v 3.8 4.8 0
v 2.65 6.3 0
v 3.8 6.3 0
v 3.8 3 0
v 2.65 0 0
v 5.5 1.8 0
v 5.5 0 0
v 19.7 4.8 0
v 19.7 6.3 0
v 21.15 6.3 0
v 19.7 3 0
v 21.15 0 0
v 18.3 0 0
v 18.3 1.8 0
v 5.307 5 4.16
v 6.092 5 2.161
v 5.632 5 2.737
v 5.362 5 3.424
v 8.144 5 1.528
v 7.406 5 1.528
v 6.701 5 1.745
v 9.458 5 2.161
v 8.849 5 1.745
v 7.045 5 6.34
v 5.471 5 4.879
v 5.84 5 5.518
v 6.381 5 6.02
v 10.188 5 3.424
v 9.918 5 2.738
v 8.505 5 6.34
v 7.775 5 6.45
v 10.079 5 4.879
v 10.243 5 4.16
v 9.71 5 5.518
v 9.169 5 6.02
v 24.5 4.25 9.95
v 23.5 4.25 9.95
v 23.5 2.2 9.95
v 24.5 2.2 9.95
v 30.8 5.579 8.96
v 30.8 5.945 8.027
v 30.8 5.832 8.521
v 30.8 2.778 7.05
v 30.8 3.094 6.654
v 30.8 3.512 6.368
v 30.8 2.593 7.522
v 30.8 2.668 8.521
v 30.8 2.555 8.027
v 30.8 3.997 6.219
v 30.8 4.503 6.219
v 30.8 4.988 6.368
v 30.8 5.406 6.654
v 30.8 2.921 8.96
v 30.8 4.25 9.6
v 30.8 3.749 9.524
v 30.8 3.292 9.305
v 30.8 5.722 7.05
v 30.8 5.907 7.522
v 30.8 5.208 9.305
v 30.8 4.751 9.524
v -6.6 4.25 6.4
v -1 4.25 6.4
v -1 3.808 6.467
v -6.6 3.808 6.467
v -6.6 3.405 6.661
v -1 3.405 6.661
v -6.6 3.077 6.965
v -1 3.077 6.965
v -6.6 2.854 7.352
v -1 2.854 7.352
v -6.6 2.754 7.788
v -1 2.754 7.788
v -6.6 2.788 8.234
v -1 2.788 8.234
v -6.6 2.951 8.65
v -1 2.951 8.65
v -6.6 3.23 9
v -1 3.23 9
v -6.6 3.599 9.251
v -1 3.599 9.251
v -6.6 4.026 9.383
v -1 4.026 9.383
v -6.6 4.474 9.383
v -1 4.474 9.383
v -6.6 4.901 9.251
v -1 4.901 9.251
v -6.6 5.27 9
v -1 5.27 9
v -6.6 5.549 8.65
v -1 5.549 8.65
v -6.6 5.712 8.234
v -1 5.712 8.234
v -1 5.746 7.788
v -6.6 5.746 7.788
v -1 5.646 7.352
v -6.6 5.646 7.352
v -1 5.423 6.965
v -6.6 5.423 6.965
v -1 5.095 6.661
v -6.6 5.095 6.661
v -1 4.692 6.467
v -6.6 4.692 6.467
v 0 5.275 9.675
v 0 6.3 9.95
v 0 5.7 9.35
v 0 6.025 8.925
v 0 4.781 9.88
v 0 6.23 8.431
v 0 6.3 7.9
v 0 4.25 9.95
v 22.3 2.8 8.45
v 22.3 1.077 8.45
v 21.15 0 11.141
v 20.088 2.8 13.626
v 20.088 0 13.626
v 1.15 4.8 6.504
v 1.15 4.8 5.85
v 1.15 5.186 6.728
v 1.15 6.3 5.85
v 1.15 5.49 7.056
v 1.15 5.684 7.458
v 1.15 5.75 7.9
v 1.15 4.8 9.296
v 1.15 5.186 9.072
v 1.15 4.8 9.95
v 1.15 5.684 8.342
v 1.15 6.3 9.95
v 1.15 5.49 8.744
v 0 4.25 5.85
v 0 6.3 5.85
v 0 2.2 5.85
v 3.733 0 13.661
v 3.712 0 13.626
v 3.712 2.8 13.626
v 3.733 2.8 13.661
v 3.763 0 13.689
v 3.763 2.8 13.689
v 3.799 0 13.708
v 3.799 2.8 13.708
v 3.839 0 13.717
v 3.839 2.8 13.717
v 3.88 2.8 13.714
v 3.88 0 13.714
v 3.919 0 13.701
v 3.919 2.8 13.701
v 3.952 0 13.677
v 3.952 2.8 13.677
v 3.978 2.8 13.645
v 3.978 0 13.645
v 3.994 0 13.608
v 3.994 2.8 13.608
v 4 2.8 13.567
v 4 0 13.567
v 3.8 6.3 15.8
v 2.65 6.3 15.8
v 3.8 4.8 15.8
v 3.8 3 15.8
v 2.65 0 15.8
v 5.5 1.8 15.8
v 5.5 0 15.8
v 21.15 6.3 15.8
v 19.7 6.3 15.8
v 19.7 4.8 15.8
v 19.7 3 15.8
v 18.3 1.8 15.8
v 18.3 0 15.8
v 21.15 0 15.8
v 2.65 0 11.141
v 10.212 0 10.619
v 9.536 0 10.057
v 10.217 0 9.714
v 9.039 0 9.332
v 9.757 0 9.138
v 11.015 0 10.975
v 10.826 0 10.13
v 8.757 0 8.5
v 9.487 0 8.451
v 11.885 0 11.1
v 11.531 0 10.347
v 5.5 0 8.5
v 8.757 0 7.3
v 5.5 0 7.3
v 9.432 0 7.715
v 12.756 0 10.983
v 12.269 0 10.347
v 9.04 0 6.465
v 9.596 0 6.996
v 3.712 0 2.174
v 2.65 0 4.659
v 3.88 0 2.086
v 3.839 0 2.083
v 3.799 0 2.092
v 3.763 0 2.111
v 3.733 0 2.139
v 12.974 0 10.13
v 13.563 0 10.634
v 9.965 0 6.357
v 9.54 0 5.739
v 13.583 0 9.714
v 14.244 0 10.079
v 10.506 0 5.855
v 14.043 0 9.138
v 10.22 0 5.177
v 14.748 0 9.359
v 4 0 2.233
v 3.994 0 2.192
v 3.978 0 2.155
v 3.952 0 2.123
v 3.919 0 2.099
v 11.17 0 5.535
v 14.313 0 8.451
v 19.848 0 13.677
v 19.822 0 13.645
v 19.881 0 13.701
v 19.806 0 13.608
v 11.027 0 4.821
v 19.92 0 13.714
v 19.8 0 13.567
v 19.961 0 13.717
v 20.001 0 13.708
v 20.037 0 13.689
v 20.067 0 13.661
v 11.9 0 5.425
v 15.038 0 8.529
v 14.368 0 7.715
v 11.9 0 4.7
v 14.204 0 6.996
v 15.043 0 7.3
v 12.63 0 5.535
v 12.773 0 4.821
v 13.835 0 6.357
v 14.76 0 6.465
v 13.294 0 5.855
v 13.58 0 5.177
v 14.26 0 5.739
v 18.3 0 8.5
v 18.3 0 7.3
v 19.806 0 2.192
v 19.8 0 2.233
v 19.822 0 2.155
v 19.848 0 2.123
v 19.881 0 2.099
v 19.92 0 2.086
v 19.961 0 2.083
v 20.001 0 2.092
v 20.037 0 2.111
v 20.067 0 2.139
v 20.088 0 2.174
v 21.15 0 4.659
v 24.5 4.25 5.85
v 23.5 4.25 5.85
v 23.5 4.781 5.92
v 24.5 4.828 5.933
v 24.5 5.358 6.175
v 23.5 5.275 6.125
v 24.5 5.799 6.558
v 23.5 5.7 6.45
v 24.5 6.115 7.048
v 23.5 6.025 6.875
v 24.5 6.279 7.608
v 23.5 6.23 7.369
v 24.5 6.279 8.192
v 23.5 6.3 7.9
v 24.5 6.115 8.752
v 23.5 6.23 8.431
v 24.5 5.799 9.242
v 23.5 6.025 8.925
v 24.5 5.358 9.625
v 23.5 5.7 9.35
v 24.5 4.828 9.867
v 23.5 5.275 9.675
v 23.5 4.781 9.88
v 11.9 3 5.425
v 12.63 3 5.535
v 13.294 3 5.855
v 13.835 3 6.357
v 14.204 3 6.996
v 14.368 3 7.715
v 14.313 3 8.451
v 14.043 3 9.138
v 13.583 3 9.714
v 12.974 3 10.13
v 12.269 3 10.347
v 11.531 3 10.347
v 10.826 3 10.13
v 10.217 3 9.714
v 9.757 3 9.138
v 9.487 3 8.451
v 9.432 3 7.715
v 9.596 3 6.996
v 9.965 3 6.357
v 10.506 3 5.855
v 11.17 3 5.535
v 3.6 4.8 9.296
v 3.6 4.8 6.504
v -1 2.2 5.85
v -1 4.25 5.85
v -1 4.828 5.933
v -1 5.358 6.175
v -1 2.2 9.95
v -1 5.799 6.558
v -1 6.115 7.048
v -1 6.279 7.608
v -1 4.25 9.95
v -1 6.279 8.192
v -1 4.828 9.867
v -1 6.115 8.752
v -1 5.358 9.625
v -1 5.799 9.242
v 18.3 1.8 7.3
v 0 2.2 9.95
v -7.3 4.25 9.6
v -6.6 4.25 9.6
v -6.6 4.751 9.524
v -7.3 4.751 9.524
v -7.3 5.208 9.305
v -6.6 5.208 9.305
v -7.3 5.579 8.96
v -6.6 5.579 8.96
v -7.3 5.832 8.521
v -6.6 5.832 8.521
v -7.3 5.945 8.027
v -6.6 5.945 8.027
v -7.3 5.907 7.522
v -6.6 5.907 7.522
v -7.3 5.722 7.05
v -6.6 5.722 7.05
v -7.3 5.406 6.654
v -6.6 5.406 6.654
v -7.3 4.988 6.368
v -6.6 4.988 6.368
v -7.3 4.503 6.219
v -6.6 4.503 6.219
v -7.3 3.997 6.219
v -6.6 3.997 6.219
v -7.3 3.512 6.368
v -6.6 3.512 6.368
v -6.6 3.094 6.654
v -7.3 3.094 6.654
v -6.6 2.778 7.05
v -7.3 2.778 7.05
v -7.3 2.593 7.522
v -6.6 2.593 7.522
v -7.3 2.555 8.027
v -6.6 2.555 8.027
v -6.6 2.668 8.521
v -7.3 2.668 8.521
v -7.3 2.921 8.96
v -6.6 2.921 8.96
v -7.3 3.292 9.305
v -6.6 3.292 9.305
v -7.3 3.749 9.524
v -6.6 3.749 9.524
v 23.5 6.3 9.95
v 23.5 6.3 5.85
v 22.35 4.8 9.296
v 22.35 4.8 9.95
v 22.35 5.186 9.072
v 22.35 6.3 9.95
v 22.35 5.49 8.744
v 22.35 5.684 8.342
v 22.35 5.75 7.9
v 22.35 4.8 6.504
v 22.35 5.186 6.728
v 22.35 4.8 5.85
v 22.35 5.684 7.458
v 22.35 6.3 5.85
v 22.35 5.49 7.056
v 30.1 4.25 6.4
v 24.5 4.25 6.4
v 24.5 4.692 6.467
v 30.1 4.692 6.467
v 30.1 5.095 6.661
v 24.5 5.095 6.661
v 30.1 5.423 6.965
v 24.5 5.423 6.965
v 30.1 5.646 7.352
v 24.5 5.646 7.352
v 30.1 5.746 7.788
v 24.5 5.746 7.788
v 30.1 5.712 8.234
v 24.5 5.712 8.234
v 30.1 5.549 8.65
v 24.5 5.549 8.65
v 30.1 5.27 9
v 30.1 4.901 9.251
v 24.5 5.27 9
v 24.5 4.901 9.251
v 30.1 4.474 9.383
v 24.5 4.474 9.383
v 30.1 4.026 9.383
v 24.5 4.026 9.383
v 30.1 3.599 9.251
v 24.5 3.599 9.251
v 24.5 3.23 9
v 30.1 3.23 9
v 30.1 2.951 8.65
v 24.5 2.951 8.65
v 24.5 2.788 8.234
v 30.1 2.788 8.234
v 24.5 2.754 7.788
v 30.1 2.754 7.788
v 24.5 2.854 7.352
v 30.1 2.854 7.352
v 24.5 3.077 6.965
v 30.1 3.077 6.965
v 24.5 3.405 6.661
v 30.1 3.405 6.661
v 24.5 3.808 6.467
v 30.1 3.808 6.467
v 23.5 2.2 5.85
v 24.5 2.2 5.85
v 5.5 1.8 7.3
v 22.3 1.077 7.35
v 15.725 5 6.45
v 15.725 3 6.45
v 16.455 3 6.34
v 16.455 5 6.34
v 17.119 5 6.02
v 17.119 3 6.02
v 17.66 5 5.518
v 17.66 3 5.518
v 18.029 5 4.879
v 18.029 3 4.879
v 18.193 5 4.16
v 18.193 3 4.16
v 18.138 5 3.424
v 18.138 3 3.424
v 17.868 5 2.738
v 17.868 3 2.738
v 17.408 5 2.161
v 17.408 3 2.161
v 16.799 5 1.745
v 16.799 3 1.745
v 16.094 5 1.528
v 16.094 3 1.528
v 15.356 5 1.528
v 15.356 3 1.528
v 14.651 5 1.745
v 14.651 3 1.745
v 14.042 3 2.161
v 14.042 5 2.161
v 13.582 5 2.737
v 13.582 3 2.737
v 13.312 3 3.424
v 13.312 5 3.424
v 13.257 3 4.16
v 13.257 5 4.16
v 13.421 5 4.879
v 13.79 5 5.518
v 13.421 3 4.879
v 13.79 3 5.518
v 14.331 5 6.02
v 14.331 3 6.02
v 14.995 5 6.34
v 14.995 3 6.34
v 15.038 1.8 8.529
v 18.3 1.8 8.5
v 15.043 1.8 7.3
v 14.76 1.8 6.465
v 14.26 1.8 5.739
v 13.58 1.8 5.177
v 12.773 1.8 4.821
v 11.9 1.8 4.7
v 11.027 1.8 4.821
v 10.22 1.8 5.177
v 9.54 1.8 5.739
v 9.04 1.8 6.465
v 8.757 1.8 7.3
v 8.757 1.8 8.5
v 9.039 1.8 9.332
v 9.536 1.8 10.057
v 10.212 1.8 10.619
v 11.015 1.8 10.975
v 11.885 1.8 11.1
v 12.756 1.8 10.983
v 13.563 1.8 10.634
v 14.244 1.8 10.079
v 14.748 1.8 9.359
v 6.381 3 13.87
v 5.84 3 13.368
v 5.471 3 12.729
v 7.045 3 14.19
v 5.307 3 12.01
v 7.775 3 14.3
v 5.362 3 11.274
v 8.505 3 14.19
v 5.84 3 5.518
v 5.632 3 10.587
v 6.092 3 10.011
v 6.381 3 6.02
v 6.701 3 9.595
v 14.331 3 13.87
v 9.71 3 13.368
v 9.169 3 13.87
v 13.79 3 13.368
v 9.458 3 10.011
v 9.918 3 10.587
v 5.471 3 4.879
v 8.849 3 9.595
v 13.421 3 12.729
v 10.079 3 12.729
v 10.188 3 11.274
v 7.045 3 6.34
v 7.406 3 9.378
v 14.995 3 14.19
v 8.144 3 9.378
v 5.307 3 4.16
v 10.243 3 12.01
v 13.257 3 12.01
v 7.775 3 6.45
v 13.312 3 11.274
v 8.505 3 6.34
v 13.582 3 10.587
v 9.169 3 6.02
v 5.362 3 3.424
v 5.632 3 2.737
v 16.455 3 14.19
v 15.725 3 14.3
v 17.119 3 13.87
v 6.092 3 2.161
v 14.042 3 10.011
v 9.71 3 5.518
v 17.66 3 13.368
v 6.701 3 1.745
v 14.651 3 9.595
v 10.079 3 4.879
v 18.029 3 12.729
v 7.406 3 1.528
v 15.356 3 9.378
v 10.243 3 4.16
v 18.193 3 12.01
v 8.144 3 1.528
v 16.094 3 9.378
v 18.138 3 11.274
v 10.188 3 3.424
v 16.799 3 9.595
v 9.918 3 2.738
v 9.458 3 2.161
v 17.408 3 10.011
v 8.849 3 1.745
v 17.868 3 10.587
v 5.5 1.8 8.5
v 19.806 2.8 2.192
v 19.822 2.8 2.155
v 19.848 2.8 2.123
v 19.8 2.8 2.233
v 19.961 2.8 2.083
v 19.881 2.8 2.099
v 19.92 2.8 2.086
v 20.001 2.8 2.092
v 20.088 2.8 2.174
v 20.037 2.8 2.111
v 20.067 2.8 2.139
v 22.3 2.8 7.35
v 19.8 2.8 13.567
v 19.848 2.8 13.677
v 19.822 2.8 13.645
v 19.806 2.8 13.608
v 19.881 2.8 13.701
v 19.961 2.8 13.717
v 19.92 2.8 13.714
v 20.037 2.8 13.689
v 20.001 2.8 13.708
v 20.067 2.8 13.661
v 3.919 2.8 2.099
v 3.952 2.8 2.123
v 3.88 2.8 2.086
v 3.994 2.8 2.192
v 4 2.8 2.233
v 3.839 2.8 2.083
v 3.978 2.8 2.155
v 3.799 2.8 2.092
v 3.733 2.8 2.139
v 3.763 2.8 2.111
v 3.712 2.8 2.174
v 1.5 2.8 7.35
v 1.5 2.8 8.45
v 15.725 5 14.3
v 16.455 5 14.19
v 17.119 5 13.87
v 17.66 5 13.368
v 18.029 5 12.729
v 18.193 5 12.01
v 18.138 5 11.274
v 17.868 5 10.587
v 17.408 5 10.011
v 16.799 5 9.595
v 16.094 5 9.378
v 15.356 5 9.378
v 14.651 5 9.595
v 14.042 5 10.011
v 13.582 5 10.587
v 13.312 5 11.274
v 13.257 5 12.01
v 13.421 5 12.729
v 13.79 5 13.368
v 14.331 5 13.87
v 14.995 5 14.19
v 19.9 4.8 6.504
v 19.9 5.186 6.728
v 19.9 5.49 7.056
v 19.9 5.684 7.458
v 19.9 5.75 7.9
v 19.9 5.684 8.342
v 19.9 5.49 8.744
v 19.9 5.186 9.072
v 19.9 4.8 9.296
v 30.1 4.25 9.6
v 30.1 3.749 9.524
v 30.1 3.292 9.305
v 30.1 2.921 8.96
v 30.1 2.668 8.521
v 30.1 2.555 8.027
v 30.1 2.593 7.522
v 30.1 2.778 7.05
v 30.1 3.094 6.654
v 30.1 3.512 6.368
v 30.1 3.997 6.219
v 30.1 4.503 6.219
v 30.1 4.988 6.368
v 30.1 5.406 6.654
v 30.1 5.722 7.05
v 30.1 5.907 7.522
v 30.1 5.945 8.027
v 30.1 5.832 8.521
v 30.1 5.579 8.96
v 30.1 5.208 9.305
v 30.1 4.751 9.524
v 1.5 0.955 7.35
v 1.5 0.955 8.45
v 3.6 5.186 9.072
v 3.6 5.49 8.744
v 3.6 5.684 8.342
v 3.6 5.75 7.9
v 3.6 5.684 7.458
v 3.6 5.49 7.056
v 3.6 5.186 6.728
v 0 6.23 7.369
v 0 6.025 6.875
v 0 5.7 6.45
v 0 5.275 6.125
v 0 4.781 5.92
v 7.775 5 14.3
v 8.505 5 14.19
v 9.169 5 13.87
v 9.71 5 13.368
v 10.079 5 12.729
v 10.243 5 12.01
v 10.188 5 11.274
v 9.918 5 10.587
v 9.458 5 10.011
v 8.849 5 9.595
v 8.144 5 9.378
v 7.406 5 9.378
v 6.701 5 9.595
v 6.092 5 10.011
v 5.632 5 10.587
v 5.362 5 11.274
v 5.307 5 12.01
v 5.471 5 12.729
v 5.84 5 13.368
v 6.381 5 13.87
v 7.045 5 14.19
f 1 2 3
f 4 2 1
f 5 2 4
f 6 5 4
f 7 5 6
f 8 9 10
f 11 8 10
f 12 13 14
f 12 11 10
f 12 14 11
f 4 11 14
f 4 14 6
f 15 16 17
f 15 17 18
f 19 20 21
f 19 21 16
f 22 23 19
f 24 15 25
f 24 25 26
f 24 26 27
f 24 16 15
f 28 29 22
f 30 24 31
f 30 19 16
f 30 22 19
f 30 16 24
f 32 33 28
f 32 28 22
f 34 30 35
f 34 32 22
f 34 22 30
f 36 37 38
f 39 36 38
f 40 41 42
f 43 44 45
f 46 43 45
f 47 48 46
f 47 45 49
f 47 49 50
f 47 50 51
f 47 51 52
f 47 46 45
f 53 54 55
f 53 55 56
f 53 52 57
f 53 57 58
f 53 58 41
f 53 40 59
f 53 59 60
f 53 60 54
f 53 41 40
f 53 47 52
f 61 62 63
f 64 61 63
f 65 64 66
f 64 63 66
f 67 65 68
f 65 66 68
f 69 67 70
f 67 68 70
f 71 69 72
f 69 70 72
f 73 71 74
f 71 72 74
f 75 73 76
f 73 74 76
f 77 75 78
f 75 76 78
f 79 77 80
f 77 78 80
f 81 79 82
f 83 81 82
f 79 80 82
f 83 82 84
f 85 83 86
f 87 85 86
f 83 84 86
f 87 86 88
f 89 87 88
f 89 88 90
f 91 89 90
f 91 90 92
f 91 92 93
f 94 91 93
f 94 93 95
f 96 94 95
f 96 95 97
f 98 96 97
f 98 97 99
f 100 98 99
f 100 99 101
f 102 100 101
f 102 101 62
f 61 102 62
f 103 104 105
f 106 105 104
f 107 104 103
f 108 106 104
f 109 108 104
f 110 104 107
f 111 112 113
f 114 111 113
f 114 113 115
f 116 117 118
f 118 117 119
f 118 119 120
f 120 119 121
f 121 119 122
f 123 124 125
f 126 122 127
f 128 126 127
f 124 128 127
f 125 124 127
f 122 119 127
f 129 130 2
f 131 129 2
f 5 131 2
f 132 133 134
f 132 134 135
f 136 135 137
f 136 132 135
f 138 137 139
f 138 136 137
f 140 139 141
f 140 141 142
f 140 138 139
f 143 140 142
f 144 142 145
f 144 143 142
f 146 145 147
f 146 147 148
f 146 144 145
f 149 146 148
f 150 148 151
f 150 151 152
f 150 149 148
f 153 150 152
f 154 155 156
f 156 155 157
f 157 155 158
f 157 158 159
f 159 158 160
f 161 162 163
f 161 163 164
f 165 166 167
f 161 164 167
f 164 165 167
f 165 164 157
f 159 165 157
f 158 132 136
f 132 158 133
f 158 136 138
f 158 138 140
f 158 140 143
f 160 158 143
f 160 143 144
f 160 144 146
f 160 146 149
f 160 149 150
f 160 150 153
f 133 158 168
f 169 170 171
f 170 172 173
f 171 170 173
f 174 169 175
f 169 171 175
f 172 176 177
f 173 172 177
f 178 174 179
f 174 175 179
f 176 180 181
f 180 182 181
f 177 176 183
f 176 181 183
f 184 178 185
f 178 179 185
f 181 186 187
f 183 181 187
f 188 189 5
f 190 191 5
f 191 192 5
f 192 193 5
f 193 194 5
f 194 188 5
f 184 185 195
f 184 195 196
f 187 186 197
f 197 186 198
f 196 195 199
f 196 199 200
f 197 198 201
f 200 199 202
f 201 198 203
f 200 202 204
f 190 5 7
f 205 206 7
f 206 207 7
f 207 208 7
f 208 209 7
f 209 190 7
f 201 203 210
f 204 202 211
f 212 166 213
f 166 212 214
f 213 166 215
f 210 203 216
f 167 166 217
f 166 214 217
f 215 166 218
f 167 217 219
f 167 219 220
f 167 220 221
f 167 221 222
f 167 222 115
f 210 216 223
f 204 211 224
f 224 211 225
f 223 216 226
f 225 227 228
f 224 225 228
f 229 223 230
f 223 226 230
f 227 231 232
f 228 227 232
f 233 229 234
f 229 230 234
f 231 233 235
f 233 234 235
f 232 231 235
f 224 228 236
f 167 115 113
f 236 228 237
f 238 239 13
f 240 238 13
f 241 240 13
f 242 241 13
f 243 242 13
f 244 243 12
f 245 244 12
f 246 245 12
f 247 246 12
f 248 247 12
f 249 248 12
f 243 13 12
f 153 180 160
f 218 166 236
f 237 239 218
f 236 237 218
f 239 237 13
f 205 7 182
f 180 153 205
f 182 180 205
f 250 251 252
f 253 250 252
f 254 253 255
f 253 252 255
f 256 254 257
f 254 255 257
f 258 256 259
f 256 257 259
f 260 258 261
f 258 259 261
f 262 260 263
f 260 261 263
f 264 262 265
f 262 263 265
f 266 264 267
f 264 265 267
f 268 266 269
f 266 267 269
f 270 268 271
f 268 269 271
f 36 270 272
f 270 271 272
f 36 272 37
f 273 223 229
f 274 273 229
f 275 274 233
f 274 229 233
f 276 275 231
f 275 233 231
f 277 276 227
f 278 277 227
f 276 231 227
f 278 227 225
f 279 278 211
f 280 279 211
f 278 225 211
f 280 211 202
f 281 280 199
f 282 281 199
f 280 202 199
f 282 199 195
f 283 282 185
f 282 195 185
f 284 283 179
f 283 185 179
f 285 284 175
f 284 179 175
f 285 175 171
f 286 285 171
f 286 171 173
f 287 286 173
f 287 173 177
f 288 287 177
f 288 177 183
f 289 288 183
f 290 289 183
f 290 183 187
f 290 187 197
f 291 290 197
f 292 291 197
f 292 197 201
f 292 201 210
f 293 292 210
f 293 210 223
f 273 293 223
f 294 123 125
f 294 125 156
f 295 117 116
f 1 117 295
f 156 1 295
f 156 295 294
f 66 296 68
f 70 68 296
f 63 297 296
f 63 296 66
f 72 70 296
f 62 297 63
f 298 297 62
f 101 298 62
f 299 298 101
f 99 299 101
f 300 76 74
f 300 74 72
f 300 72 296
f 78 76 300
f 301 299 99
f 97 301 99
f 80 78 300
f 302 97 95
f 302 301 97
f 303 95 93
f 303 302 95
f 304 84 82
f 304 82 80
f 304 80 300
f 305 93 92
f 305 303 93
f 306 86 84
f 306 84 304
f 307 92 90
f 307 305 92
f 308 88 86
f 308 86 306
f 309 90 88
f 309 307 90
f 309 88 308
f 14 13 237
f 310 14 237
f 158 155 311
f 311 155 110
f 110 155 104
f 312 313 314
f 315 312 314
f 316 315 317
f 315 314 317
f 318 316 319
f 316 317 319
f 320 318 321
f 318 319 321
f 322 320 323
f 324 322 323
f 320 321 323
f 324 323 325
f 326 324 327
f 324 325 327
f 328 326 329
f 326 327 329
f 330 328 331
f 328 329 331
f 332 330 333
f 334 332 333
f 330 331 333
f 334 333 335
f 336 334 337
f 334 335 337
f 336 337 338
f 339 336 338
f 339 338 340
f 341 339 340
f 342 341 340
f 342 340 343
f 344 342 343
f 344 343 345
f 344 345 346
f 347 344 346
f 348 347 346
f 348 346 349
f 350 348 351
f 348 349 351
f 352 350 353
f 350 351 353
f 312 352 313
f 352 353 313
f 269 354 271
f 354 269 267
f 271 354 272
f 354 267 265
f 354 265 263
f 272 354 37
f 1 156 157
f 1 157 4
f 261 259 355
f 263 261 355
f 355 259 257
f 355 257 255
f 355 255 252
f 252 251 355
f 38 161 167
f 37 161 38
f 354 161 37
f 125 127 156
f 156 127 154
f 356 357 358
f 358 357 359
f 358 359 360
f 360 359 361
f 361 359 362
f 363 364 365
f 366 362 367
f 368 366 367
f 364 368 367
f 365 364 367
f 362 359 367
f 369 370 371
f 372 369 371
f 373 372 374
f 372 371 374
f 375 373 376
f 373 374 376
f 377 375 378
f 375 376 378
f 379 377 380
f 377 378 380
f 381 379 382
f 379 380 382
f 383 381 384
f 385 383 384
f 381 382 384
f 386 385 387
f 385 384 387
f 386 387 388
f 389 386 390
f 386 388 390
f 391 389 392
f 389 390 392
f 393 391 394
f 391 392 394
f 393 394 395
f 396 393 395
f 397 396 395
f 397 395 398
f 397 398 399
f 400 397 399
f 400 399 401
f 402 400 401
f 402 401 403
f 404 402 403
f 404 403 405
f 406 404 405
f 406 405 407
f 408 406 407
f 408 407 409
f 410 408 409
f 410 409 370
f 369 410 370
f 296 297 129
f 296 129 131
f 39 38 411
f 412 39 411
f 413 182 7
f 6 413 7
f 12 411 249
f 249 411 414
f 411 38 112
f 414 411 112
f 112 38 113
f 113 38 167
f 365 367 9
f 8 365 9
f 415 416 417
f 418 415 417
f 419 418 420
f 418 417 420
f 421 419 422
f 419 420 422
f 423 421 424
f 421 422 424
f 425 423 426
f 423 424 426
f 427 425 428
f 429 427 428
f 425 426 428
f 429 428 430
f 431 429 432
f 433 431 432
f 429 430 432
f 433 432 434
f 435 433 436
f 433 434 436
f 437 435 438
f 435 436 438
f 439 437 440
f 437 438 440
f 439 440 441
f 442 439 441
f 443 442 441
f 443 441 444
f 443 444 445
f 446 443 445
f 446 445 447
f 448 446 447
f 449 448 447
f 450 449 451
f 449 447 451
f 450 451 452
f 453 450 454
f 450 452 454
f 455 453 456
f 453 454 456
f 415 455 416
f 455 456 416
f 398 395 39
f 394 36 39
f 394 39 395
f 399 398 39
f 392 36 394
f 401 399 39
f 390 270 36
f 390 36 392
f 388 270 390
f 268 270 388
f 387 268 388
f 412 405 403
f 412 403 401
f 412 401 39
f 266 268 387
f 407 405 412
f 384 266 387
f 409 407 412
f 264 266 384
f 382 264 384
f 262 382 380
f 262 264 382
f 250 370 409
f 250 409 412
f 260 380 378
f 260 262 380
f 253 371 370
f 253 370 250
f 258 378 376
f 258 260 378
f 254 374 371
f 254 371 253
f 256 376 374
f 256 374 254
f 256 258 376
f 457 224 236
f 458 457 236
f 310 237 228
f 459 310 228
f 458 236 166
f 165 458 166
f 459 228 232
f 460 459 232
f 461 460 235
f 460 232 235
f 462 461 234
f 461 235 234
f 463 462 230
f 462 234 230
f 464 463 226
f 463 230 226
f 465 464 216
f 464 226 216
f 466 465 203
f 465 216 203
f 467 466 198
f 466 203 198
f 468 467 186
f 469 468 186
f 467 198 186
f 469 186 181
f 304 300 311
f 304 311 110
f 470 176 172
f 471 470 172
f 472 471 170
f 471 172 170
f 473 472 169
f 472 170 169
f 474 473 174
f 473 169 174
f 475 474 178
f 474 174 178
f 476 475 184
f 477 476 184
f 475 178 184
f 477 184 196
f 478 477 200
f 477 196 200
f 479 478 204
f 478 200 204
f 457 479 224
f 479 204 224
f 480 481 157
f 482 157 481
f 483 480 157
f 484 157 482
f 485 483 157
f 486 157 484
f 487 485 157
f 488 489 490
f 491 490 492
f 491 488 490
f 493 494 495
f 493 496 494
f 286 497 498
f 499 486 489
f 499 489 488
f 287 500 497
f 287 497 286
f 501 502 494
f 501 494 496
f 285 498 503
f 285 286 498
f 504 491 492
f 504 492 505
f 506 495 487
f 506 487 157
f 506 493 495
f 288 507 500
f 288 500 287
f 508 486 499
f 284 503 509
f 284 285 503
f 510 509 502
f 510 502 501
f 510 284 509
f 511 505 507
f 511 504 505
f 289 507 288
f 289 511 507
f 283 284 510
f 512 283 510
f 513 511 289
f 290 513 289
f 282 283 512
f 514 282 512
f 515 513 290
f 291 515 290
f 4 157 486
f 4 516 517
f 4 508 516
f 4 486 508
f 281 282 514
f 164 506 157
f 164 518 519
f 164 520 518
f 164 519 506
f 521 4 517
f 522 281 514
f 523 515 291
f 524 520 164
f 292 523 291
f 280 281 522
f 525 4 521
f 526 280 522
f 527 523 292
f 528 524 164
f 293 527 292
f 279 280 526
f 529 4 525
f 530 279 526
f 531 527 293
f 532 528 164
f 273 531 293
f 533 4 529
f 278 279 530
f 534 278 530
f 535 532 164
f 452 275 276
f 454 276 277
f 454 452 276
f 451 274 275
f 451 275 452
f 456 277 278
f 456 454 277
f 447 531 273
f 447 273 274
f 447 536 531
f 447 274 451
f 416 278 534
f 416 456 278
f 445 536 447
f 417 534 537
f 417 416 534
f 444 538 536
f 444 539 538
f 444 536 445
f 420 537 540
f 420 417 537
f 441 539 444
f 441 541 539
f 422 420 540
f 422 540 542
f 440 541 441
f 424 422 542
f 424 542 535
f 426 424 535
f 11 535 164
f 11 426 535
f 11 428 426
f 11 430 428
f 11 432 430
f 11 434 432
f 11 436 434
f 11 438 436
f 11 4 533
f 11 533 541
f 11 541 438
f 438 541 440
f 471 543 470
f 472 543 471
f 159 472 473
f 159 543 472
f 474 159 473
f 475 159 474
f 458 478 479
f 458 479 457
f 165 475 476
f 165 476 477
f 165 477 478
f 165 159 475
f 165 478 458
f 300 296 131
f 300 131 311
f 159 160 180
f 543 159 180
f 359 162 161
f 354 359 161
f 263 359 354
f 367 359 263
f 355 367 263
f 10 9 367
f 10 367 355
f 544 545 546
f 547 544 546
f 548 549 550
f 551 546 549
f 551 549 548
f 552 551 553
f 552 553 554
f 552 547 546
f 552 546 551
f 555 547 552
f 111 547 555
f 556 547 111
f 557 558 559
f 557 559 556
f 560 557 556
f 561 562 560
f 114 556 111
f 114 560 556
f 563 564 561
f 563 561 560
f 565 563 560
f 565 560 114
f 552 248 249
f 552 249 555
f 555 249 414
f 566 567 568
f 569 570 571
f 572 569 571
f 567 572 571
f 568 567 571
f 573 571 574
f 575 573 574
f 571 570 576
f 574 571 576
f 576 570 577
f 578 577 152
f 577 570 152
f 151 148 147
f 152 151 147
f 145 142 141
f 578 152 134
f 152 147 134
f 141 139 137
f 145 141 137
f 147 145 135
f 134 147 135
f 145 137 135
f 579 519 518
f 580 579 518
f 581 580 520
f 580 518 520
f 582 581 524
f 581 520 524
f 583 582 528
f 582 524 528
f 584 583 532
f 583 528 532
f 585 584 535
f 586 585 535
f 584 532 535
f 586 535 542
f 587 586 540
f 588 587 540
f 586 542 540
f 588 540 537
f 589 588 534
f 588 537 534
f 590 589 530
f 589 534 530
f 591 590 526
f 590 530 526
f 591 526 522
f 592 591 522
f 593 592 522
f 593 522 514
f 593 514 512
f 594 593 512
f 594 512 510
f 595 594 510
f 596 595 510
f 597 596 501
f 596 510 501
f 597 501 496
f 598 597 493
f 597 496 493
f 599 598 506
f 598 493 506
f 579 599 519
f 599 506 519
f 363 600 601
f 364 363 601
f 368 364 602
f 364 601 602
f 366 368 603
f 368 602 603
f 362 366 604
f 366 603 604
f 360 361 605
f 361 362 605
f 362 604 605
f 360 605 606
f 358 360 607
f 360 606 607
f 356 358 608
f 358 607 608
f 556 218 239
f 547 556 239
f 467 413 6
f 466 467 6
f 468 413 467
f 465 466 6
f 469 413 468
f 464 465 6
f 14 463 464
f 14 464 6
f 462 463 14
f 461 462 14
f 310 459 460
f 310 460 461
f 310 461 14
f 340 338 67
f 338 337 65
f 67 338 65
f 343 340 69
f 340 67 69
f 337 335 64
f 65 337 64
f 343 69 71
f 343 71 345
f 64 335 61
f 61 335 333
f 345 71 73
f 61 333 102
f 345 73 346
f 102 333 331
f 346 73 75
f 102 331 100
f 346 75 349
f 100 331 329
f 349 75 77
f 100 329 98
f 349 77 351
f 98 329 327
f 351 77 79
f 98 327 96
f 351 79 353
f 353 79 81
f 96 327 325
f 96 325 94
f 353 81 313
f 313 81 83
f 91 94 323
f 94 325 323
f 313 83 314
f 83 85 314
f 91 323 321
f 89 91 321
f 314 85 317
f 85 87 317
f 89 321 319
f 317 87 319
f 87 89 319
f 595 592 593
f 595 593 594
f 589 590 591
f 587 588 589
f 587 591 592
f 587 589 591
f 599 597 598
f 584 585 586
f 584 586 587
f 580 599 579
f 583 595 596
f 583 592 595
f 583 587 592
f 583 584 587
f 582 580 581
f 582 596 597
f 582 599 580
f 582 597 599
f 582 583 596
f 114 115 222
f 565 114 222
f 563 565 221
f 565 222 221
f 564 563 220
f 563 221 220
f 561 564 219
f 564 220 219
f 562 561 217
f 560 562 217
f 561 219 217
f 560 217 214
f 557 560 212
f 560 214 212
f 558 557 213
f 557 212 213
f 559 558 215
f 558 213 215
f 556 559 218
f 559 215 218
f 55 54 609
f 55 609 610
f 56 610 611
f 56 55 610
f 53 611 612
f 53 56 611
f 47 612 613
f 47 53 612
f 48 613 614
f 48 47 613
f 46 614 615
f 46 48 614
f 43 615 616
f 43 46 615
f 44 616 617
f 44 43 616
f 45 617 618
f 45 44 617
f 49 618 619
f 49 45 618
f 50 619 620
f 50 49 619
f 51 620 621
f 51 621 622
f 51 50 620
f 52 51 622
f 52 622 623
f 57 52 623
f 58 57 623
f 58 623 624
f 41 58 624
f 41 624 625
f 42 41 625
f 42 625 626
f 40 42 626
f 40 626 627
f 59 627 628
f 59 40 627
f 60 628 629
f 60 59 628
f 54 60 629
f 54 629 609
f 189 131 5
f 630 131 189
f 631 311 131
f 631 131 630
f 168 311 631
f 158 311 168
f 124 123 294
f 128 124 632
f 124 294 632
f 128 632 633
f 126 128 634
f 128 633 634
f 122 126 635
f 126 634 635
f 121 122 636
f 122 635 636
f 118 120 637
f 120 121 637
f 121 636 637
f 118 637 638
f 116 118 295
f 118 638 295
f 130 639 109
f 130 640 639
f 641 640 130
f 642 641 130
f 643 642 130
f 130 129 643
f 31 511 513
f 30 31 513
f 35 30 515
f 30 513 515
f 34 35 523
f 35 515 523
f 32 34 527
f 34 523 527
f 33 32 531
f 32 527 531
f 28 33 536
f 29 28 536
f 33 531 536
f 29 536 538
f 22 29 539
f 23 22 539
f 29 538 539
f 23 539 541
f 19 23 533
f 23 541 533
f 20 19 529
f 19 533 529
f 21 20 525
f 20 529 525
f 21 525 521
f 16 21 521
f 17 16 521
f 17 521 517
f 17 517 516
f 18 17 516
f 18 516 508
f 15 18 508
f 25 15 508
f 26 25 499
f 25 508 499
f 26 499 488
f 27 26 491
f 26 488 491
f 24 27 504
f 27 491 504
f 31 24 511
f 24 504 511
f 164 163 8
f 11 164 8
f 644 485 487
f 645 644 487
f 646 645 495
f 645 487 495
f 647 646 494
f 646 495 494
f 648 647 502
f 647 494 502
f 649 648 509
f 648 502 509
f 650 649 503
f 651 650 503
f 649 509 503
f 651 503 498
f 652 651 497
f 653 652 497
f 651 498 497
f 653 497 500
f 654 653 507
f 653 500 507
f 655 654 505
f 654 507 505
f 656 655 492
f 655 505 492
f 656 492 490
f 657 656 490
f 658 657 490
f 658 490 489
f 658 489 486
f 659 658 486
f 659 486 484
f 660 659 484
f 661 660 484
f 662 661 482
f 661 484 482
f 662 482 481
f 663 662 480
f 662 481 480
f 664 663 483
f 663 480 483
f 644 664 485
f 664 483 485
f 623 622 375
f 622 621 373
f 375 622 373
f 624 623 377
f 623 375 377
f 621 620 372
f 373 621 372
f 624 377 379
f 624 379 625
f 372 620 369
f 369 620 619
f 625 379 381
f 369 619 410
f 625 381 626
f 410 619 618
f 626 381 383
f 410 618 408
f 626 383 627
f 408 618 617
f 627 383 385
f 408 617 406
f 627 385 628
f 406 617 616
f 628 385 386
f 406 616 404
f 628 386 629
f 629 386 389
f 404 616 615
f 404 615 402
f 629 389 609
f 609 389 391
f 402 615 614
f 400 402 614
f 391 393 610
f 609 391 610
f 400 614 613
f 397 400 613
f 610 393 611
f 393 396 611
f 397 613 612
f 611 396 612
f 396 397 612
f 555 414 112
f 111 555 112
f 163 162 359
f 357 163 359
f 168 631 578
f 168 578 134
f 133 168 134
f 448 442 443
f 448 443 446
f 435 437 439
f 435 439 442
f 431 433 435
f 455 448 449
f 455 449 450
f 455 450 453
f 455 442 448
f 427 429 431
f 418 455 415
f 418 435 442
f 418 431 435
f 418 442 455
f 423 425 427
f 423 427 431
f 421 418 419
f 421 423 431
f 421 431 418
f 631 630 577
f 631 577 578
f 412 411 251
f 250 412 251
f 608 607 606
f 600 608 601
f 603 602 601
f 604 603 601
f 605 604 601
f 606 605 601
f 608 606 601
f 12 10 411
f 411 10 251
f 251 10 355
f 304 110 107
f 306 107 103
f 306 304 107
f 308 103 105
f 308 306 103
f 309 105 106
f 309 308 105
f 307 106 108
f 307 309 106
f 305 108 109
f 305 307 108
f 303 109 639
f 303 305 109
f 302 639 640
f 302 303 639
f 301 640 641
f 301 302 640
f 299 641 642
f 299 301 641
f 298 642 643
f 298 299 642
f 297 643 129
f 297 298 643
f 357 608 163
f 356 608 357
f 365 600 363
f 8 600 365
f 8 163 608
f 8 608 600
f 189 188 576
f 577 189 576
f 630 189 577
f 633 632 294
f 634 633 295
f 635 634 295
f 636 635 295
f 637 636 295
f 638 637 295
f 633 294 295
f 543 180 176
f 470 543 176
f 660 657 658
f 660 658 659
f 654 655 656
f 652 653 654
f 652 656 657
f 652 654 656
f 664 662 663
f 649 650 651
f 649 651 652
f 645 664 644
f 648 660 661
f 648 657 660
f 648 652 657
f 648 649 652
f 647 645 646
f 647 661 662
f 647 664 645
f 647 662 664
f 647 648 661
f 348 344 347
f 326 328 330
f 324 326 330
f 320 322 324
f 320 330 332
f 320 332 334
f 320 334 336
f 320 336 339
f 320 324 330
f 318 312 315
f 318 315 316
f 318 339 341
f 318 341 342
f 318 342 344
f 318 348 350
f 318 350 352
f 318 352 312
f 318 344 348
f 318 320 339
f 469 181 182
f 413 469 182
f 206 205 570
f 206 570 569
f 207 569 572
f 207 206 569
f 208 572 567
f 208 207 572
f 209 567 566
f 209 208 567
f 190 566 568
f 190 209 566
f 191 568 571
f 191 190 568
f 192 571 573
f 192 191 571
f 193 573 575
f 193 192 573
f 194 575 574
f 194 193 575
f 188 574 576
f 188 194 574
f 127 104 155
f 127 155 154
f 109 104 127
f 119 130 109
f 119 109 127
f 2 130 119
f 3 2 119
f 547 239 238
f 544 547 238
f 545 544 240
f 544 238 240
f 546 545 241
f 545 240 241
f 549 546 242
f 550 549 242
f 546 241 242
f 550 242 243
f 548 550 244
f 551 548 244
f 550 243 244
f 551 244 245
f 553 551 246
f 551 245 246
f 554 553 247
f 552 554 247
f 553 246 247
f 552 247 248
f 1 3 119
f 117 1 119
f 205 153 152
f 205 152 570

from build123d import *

# Parameters (mm, degrees)
SKETCH1_W                = 23.5
SKETCH1_H                = 15.8
BOSS_EXTRUDE1_DEPTH      = 6.3
SKETCH3_W                = 15.9
SKETCH3_H                = 15.8
CUT_EXTRUDE1_DEPTH       = 3.3
CUT_EXTRUDE2_DEPTH       = 30.009998276
CUT_EXTRUDE3_DEPTH       = 1.5
CUT_EXTRUDE4_DEPTH       = 30.009998276
BOSS_EXTRUDE2_DEPTH      = 1
BOSS_EXTRUDE3_DEPTH      = 5.6
BOSS_EXTRUDE3_DEPTH_BACK = 4.6
SKETCH9_R                = 1.5
BOSS_EXTRUDE4_START      = 1
BOSS_EXTRUDE4_DEPTH      = 1
BOSS_EXTRUDE5_DEPTH      = 5.6
BOSS_EXTRUDE5_DEPTH_BACK = 4.6
SKETCH11_R               = 1.5
CUT_EXTRUDE5_DEPTH       = 1.8
SKETCH13_R               = 2.475
CUT_EXTRUDE6_DEPTH       = 35.573689418
CUT_EXTRUDE7_DEPTH       = 2.8
SKETCH15_R               = 1.7
BOSS_EXTRUDE7_DEPTH      = 0.7
BOSS_EXTRUDE8_START      = 0.7
SKETCH16_R               = 1.7
BOSS_EXTRUDE8_DEPTH      = 0.7
SKETCH17_R               = 2.475
BOSS_EXTRUDE9_DEPTH      = 2


with BuildPart() as part:
    # Sketch1 → Boss-Extrude1 (new body)
    with BuildSketch(Plane(origin=(0, 0, 0), x_dir=(1, 0, 0), z_dir=(0, 1, 0))):
        with Locations((11.75, -7.9)):
            Rectangle(SKETCH1_W, SKETCH1_H)
    extrude(amount=BOSS_EXTRUDE1_DEPTH)

    # Sketch3 → Cut-Extrude1 (cut)
    with BuildSketch(Plane(origin=(0, 6.3, 0), x_dir=(1, 0, 0), z_dir=(0, 1, 0))):
        with Locations((11.75, -7.9)):
            Rectangle(SKETCH3_W, SKETCH3_H)
    extrude(amount=-CUT_EXTRUDE1_DEPTH, mode=Mode.SUBTRACT)

    # Sketch4 → Cut-Extrude2 (cut, through all)
    with BuildSketch(Plane(origin=(0, 6.3, 0), x_dir=(1, 0, 0), z_dir=(0, 1, 0))):
        Polygon((21.15, 0), (23.5, -5.85), (23.5, 0), align=None)
        Polygon((21.15, -15.8), (23.5, -9.95), (23.5, -15.8), align=None)
        Polygon((2.65, -15.8), (0, -9.95), (0, -15.8), align=None)
        Polygon((0, 0), (0, -5.85), (2.65, 0), align=None)
    extrude(amount=-CUT_EXTRUDE2_DEPTH, mode=Mode.SUBTRACT)

    # Sketch5 → Cut-Extrude3 (cut)
    with BuildSketch(Plane(origin=(0, 6.3, 0), x_dir=(1, 0, 0), z_dir=(0, 1, 0))):
        Polygon((3.8, 0), (1.15, -5.85), (1.15, -9.95), (3.8, -15.8), align=None)
        Polygon((19.7, 0), (19.7, -15.8), (22.35, -9.95), (22.35, -5.85), align=None)
    extrude(amount=-CUT_EXTRUDE3_DEPTH, mode=Mode.SUBTRACT)

    # Sketch7 → Cut-Extrude4 (cut, through all)
    with BuildSketch(Plane.XY.offset(15.8)):
        Polygon((0, 0), (0, 2.2), (2.65, 0), align=None)
        Polygon((21.15, 0), (23.5, 0), (23.5, 2.2), align=None)
    extrude(amount=-CUT_EXTRUDE4_DEPTH, mode=Mode.SUBTRACT)

    # Sketch8 → Boss-Extrude2 (add)
    with BuildSketch(Plane(origin=(23.5, 0, 0), x_dir=(0, 0, -1), z_dir=(1, 0, 0))):
        with BuildLine():
            Line((-9.95, 4.25), (-9.95, 2.2))
            Line((-9.95, 2.2), (-5.85, 2.2))
            Line((-5.85, 2.2), (-5.85, 4.25))
            ThreePointArc((-5.85, 4.25), (-7.9, 6.3), (-9.95, 4.25))
        make_face()
    extrude(amount=BOSS_EXTRUDE2_DEPTH)

    # Sketch9 → Boss-Extrude3 (add, two sides: drawn at the far end of the back side and taken through both)
    with BuildSketch(Plane(origin=(24.5, 0, 0), x_dir=(0, 0, -1), z_dir=(1, 0, 0)).offset(-BOSS_EXTRUDE3_DEPTH_BACK)):
        with Locations((-7.9, 4.25)):
            Circle(SKETCH9_R)
    extrude(amount=BOSS_EXTRUDE3_DEPTH + BOSS_EXTRUDE3_DEPTH_BACK)

    # Sketch10 → Boss-Extrude4 (add)
    with BuildSketch(Plane.ZY.offset(BOSS_EXTRUDE4_START)):
        with BuildLine():
            Line((5.85, 2.2), (9.95, 2.2))
            Line((9.95, 2.2), (9.95, 4.25))
            ThreePointArc((9.95, 4.25), (7.9, 6.3), (5.85, 4.25))
            Line((5.85, 4.25), (5.85, 2.2))
        make_face()
    extrude(amount=-BOSS_EXTRUDE4_DEPTH)

    # Sketch11 → Boss-Extrude5 (add, two sides: drawn at the far end of the back side and taken through both)
    with BuildSketch(Plane.ZY.offset(1).offset(-BOSS_EXTRUDE5_DEPTH_BACK)):
        with Locations(Location((7.9, 4.25, 0), (0, 0, 180))):
            Circle(SKETCH11_R)
    extrude(amount=BOSS_EXTRUDE5_DEPTH + BOSS_EXTRUDE5_DEPTH_BACK)

    # Sketch12 → Cut-Extrude5 (cut)
    with BuildSketch(Plane.XZ):
        with BuildLine():
            Line((18.3, 15.8), (5.5, 15.8))
            Line((5.5, 15.8), (5.5, 8.5))
            Line((5.5, 8.5), (8.756753271, 8.5))
            ThreePointArc((8.756753271, 8.5), (11.885259229, 11.099966048), (15.037585601, 8.528932905))
            Line((15.037585601, 8.528932905), (18.3, 8.5))
            Line((18.3, 8.5), (18.3, 15.8))
        make_face()
        with BuildLine():
            Line((8.756753271, 7.3), (5.5, 7.3))
            Line((5.5, 7.3), (5.5, 0))
            Line((5.5, 0), (18.3, 0))
            Line((18.3, 0), (18.3, 7.3))
            Line((18.3, 7.3), (15.043246729, 7.3))
            ThreePointArc((15.043246729, 7.3), (11.9, 4.7), (8.756753271, 7.3))
        make_face()
    extrude(amount=-CUT_EXTRUDE5_DEPTH, mode=Mode.SUBTRACT)

    # Sketch13 → Cut-Extrude6 (cut, through all)
    with BuildSketch(Plane.XZ):
        with Locations(Location((11.9, 7.9, 0), (0, 0, 270))):
            Circle(SKETCH13_R)
    extrude(amount=-CUT_EXTRUDE6_DEPTH, mode=Mode.SUBTRACT)

    # Sketch14 → Cut-Extrude7 (cut)
    with BuildSketch(Plane.XZ):
        with BuildLine():
            Line((4, 13.567291996), (4, 2.232708004))
            ThreePointArc((4, 2.232708004), (3.880084058, 2.085755802), (3.712067341, 2.173762423))
            Line((3.712067341, 2.173762423), (1.5, 7.35))
            Line((1.5, 7.35), (1.5, 8.45))
            Line((1.5, 8.45), (3.712067341, 13.626237577))
            ThreePointArc((3.712067341, 13.626237577), (3.880084058, 13.714244198), (4, 13.567291996))
        make_face()
        with BuildLine():
            Line((20.087932659, 2.173762423), (22.3, 7.35))
            Line((22.3, 7.35), (22.3, 8.45))
            Line((22.3, 8.45), (20.087932659, 13.626237577))
            ThreePointArc((20.087932659, 13.626237577), (19.919915942, 13.714244198), (19.8, 13.567291996))
            Line((19.8, 13.567291996), (19.8, 2.232708004))
            ThreePointArc((19.8, 2.232708004), (19.919915942, 2.085755802), (20.087932659, 2.173762423))
        make_face()
    extrude(amount=-CUT_EXTRUDE7_DEPTH, mode=Mode.SUBTRACT)

    # Sketch15 → Boss-Extrude7 (add)
    with BuildSketch(Plane.ZY.offset(6.6)):
        with Locations((7.9, 4.25)):
            Circle(SKETCH15_R)
    extrude(amount=BOSS_EXTRUDE7_DEPTH)

    # Sketch16 → Boss-Extrude8 (add)
    with BuildSketch(Plane(origin=(30.1, 0, 0), x_dir=(0, 0, -1), z_dir=(1, 0, 0)).offset(BOSS_EXTRUDE8_START)):
        with Locations(Location((-7.9, 4.25, 0), (0, 0, 180))):
            Circle(SKETCH16_R)
    extrude(amount=-BOSS_EXTRUDE8_DEPTH)

    # Sketch17 → Boss-Extrude9 (add)
    with BuildSketch(Plane(origin=(0, 3, 0), x_dir=(1, 0, 0), z_dir=(0, 1, 0))):
        with Locations(Location((7.775, -3.975, 0), (0, 0, 270))):
            Circle(SKETCH17_R)
        with Locations(Location((7.775, -11.825, 0), (0, 0, 270))):
            Circle(SKETCH17_R)
        with Locations(Location((15.725, -11.825, 0), (0, 0, 270))):
            Circle(SKETCH17_R)
        with Locations(Location((15.725, -3.975, 0), (0, 0, 270))):
            Circle(SKETCH17_R)
    extrude(amount=BOSS_EXTRUDE9_DEPTH)


solid = part.part
